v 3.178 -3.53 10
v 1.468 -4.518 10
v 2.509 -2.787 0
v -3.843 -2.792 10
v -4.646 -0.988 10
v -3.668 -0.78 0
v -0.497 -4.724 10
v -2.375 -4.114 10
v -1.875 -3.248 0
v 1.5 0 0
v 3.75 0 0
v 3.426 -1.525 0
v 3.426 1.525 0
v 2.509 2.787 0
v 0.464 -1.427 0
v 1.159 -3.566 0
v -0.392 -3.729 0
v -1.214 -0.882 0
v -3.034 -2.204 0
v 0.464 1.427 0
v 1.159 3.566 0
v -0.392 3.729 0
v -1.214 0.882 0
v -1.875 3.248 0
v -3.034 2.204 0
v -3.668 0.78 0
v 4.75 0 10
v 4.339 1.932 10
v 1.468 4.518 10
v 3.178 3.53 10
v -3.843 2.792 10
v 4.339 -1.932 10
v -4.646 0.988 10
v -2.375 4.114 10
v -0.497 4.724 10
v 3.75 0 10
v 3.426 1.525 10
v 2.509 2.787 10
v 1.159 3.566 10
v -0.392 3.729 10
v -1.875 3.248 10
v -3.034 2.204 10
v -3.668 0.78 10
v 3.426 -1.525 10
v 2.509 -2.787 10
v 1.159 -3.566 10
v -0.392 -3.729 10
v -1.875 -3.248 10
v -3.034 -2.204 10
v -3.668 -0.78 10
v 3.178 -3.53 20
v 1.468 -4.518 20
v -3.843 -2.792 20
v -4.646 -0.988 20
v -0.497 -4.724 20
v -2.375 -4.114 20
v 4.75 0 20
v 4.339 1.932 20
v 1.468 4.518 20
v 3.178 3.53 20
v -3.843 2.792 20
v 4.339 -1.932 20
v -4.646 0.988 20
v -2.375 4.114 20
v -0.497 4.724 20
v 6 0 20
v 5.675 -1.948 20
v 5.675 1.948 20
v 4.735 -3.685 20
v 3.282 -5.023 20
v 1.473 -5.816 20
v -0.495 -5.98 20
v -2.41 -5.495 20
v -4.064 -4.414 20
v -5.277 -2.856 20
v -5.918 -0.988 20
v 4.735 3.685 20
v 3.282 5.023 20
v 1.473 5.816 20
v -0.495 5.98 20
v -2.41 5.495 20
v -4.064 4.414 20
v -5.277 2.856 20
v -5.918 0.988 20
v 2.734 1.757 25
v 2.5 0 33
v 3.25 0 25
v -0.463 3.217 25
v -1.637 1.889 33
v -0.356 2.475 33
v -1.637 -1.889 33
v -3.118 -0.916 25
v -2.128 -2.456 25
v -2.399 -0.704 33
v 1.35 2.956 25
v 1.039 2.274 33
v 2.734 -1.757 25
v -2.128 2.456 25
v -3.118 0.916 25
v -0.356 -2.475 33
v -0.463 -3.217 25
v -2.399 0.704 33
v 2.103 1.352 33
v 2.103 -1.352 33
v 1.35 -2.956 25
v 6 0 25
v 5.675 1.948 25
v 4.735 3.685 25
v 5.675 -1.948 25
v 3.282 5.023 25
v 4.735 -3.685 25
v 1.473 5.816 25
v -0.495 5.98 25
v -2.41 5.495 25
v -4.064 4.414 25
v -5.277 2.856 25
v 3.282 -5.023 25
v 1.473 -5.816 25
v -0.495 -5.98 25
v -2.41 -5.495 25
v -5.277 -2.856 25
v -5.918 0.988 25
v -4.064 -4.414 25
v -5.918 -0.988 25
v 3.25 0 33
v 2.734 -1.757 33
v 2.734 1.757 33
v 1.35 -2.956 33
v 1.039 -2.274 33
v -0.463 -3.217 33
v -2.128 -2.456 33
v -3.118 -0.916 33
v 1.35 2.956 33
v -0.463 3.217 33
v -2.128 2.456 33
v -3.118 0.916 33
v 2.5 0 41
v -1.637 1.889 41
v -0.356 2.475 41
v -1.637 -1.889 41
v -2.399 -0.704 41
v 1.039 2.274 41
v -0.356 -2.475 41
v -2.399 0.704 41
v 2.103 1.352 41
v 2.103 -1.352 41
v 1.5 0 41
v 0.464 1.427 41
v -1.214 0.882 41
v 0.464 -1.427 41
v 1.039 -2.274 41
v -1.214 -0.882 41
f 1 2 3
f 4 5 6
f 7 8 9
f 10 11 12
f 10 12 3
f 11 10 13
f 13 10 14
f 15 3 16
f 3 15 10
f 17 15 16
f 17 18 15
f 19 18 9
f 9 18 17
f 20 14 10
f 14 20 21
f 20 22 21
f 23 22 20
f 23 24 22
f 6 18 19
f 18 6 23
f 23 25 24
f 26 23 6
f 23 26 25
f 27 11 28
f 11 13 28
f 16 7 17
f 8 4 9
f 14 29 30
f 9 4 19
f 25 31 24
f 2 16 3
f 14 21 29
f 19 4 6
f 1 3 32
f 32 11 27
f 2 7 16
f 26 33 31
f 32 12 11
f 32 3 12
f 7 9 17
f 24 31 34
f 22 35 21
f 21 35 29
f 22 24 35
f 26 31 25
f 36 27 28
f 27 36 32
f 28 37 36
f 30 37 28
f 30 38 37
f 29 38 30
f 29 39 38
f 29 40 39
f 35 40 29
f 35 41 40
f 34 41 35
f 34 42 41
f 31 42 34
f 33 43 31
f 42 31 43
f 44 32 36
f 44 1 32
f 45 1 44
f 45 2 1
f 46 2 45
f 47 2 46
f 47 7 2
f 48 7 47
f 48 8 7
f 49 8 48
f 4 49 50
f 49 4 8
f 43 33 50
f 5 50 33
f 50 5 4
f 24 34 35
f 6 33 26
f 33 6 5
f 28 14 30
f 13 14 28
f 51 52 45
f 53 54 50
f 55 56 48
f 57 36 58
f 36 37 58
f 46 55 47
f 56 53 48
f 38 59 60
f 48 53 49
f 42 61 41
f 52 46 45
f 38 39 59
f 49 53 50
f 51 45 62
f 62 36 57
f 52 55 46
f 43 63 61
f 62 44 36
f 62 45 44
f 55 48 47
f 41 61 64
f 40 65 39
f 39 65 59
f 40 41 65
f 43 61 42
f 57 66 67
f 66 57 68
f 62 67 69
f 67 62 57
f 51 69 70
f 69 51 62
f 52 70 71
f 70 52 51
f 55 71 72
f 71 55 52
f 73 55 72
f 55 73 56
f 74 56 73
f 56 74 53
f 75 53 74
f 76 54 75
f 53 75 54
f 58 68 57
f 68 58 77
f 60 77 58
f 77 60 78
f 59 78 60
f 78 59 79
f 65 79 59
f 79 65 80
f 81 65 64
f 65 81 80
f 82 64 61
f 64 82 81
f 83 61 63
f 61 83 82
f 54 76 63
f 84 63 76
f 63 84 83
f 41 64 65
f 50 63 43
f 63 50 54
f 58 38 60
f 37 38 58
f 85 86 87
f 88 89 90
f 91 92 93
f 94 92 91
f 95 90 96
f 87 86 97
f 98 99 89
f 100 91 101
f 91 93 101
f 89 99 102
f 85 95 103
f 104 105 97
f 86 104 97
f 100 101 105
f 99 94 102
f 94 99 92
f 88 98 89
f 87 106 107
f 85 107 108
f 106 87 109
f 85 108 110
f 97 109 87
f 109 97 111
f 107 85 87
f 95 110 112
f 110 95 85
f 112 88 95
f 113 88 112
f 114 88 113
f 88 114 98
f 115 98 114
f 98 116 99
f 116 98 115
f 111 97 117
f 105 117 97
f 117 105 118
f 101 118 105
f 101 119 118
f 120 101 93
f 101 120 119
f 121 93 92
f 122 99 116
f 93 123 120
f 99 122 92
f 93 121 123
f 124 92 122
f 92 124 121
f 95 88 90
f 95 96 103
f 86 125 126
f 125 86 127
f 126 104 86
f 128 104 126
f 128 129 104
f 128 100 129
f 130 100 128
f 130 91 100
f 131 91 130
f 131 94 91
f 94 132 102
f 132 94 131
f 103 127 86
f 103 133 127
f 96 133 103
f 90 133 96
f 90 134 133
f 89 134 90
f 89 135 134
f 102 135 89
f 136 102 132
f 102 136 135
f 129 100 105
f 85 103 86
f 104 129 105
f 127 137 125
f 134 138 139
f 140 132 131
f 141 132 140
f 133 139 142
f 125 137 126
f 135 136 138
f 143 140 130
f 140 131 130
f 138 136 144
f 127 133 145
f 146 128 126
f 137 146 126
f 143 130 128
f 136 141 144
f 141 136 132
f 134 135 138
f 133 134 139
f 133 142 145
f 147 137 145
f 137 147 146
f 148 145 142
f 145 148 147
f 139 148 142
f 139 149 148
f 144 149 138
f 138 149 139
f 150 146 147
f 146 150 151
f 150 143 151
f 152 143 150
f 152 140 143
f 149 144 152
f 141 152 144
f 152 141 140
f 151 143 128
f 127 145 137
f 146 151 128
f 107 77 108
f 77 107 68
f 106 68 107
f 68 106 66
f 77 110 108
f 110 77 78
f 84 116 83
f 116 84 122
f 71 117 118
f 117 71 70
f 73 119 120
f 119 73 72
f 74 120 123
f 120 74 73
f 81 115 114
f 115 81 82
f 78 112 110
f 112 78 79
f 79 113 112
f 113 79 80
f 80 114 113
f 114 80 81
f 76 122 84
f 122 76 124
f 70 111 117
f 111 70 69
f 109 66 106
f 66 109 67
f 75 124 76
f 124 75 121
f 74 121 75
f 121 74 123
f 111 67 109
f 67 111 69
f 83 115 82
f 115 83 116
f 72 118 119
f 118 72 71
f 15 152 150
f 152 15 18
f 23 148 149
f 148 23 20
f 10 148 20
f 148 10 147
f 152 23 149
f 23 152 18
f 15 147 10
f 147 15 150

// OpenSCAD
// Dimensions
bore_dia = 3.0;               // Inner bore diameter (mm)
barb8_bottom_dia = 7.5;       // 8mm tubing barb bottom diameter (mm)
barb8_top_dia = 9.5;          // 8mm tubing barb top diameter (mm)
barb8_height = 10.0;          // Height of each 8mm barb (mm)
collar_dia = 12.0;            // Collar diameter (mm)
collar_height = 5.0;          // Collar height (mm)
barb5_bottom_dia = 6.5;       // 5mm tubing barb bottom diameter (mm)
barb5_top_dia = 5.0;          // 5mm tubing barb top diameter (mm)
barb5_height = 8.0;           // Height of each 5mm barb (mm)
total_height = 41.0;          // Total height of the part (mm)

// Resolution
fn = 64;

// Part Construction
difference() {
    union() {
        // 8mm Barb Section (Z = 0 to 20)
        // Two identical barbs stacked
        for (i = [0 : 1]) {
            translate([0, 0, i * barb8_height]) {
                cylinder(h = barb8_height, d1 = barb8_bottom_dia, d2 = barb8_top_dia);
            }
        }

        // Collar Section (Z = 20 to 25)
        translate([0, 0, 20]) {
            cylinder(h = collar_height, d = collar_dia);
        }

        // 5mm Barb Section (Z = 25 to 41)
        // Two identical barbs stacked
        translate([0, 0, 25]) {
            for (i = [0 : 1]) {
                translate([0, 0, i * barb5_height]) {
                    cylinder(h = barb5_height, d1 = barb5_bottom_dia, d2 = barb5_top_dia);
                }
            }
        }
    }

    // Central Bore (runs through full length)
    // We extend the cylinder slightly beyond the boundaries to ensure a clean cut
    translate([0, 0, -1]) {
        cylinder(h = total_height + 2, d = bore_dia);
    }
}
